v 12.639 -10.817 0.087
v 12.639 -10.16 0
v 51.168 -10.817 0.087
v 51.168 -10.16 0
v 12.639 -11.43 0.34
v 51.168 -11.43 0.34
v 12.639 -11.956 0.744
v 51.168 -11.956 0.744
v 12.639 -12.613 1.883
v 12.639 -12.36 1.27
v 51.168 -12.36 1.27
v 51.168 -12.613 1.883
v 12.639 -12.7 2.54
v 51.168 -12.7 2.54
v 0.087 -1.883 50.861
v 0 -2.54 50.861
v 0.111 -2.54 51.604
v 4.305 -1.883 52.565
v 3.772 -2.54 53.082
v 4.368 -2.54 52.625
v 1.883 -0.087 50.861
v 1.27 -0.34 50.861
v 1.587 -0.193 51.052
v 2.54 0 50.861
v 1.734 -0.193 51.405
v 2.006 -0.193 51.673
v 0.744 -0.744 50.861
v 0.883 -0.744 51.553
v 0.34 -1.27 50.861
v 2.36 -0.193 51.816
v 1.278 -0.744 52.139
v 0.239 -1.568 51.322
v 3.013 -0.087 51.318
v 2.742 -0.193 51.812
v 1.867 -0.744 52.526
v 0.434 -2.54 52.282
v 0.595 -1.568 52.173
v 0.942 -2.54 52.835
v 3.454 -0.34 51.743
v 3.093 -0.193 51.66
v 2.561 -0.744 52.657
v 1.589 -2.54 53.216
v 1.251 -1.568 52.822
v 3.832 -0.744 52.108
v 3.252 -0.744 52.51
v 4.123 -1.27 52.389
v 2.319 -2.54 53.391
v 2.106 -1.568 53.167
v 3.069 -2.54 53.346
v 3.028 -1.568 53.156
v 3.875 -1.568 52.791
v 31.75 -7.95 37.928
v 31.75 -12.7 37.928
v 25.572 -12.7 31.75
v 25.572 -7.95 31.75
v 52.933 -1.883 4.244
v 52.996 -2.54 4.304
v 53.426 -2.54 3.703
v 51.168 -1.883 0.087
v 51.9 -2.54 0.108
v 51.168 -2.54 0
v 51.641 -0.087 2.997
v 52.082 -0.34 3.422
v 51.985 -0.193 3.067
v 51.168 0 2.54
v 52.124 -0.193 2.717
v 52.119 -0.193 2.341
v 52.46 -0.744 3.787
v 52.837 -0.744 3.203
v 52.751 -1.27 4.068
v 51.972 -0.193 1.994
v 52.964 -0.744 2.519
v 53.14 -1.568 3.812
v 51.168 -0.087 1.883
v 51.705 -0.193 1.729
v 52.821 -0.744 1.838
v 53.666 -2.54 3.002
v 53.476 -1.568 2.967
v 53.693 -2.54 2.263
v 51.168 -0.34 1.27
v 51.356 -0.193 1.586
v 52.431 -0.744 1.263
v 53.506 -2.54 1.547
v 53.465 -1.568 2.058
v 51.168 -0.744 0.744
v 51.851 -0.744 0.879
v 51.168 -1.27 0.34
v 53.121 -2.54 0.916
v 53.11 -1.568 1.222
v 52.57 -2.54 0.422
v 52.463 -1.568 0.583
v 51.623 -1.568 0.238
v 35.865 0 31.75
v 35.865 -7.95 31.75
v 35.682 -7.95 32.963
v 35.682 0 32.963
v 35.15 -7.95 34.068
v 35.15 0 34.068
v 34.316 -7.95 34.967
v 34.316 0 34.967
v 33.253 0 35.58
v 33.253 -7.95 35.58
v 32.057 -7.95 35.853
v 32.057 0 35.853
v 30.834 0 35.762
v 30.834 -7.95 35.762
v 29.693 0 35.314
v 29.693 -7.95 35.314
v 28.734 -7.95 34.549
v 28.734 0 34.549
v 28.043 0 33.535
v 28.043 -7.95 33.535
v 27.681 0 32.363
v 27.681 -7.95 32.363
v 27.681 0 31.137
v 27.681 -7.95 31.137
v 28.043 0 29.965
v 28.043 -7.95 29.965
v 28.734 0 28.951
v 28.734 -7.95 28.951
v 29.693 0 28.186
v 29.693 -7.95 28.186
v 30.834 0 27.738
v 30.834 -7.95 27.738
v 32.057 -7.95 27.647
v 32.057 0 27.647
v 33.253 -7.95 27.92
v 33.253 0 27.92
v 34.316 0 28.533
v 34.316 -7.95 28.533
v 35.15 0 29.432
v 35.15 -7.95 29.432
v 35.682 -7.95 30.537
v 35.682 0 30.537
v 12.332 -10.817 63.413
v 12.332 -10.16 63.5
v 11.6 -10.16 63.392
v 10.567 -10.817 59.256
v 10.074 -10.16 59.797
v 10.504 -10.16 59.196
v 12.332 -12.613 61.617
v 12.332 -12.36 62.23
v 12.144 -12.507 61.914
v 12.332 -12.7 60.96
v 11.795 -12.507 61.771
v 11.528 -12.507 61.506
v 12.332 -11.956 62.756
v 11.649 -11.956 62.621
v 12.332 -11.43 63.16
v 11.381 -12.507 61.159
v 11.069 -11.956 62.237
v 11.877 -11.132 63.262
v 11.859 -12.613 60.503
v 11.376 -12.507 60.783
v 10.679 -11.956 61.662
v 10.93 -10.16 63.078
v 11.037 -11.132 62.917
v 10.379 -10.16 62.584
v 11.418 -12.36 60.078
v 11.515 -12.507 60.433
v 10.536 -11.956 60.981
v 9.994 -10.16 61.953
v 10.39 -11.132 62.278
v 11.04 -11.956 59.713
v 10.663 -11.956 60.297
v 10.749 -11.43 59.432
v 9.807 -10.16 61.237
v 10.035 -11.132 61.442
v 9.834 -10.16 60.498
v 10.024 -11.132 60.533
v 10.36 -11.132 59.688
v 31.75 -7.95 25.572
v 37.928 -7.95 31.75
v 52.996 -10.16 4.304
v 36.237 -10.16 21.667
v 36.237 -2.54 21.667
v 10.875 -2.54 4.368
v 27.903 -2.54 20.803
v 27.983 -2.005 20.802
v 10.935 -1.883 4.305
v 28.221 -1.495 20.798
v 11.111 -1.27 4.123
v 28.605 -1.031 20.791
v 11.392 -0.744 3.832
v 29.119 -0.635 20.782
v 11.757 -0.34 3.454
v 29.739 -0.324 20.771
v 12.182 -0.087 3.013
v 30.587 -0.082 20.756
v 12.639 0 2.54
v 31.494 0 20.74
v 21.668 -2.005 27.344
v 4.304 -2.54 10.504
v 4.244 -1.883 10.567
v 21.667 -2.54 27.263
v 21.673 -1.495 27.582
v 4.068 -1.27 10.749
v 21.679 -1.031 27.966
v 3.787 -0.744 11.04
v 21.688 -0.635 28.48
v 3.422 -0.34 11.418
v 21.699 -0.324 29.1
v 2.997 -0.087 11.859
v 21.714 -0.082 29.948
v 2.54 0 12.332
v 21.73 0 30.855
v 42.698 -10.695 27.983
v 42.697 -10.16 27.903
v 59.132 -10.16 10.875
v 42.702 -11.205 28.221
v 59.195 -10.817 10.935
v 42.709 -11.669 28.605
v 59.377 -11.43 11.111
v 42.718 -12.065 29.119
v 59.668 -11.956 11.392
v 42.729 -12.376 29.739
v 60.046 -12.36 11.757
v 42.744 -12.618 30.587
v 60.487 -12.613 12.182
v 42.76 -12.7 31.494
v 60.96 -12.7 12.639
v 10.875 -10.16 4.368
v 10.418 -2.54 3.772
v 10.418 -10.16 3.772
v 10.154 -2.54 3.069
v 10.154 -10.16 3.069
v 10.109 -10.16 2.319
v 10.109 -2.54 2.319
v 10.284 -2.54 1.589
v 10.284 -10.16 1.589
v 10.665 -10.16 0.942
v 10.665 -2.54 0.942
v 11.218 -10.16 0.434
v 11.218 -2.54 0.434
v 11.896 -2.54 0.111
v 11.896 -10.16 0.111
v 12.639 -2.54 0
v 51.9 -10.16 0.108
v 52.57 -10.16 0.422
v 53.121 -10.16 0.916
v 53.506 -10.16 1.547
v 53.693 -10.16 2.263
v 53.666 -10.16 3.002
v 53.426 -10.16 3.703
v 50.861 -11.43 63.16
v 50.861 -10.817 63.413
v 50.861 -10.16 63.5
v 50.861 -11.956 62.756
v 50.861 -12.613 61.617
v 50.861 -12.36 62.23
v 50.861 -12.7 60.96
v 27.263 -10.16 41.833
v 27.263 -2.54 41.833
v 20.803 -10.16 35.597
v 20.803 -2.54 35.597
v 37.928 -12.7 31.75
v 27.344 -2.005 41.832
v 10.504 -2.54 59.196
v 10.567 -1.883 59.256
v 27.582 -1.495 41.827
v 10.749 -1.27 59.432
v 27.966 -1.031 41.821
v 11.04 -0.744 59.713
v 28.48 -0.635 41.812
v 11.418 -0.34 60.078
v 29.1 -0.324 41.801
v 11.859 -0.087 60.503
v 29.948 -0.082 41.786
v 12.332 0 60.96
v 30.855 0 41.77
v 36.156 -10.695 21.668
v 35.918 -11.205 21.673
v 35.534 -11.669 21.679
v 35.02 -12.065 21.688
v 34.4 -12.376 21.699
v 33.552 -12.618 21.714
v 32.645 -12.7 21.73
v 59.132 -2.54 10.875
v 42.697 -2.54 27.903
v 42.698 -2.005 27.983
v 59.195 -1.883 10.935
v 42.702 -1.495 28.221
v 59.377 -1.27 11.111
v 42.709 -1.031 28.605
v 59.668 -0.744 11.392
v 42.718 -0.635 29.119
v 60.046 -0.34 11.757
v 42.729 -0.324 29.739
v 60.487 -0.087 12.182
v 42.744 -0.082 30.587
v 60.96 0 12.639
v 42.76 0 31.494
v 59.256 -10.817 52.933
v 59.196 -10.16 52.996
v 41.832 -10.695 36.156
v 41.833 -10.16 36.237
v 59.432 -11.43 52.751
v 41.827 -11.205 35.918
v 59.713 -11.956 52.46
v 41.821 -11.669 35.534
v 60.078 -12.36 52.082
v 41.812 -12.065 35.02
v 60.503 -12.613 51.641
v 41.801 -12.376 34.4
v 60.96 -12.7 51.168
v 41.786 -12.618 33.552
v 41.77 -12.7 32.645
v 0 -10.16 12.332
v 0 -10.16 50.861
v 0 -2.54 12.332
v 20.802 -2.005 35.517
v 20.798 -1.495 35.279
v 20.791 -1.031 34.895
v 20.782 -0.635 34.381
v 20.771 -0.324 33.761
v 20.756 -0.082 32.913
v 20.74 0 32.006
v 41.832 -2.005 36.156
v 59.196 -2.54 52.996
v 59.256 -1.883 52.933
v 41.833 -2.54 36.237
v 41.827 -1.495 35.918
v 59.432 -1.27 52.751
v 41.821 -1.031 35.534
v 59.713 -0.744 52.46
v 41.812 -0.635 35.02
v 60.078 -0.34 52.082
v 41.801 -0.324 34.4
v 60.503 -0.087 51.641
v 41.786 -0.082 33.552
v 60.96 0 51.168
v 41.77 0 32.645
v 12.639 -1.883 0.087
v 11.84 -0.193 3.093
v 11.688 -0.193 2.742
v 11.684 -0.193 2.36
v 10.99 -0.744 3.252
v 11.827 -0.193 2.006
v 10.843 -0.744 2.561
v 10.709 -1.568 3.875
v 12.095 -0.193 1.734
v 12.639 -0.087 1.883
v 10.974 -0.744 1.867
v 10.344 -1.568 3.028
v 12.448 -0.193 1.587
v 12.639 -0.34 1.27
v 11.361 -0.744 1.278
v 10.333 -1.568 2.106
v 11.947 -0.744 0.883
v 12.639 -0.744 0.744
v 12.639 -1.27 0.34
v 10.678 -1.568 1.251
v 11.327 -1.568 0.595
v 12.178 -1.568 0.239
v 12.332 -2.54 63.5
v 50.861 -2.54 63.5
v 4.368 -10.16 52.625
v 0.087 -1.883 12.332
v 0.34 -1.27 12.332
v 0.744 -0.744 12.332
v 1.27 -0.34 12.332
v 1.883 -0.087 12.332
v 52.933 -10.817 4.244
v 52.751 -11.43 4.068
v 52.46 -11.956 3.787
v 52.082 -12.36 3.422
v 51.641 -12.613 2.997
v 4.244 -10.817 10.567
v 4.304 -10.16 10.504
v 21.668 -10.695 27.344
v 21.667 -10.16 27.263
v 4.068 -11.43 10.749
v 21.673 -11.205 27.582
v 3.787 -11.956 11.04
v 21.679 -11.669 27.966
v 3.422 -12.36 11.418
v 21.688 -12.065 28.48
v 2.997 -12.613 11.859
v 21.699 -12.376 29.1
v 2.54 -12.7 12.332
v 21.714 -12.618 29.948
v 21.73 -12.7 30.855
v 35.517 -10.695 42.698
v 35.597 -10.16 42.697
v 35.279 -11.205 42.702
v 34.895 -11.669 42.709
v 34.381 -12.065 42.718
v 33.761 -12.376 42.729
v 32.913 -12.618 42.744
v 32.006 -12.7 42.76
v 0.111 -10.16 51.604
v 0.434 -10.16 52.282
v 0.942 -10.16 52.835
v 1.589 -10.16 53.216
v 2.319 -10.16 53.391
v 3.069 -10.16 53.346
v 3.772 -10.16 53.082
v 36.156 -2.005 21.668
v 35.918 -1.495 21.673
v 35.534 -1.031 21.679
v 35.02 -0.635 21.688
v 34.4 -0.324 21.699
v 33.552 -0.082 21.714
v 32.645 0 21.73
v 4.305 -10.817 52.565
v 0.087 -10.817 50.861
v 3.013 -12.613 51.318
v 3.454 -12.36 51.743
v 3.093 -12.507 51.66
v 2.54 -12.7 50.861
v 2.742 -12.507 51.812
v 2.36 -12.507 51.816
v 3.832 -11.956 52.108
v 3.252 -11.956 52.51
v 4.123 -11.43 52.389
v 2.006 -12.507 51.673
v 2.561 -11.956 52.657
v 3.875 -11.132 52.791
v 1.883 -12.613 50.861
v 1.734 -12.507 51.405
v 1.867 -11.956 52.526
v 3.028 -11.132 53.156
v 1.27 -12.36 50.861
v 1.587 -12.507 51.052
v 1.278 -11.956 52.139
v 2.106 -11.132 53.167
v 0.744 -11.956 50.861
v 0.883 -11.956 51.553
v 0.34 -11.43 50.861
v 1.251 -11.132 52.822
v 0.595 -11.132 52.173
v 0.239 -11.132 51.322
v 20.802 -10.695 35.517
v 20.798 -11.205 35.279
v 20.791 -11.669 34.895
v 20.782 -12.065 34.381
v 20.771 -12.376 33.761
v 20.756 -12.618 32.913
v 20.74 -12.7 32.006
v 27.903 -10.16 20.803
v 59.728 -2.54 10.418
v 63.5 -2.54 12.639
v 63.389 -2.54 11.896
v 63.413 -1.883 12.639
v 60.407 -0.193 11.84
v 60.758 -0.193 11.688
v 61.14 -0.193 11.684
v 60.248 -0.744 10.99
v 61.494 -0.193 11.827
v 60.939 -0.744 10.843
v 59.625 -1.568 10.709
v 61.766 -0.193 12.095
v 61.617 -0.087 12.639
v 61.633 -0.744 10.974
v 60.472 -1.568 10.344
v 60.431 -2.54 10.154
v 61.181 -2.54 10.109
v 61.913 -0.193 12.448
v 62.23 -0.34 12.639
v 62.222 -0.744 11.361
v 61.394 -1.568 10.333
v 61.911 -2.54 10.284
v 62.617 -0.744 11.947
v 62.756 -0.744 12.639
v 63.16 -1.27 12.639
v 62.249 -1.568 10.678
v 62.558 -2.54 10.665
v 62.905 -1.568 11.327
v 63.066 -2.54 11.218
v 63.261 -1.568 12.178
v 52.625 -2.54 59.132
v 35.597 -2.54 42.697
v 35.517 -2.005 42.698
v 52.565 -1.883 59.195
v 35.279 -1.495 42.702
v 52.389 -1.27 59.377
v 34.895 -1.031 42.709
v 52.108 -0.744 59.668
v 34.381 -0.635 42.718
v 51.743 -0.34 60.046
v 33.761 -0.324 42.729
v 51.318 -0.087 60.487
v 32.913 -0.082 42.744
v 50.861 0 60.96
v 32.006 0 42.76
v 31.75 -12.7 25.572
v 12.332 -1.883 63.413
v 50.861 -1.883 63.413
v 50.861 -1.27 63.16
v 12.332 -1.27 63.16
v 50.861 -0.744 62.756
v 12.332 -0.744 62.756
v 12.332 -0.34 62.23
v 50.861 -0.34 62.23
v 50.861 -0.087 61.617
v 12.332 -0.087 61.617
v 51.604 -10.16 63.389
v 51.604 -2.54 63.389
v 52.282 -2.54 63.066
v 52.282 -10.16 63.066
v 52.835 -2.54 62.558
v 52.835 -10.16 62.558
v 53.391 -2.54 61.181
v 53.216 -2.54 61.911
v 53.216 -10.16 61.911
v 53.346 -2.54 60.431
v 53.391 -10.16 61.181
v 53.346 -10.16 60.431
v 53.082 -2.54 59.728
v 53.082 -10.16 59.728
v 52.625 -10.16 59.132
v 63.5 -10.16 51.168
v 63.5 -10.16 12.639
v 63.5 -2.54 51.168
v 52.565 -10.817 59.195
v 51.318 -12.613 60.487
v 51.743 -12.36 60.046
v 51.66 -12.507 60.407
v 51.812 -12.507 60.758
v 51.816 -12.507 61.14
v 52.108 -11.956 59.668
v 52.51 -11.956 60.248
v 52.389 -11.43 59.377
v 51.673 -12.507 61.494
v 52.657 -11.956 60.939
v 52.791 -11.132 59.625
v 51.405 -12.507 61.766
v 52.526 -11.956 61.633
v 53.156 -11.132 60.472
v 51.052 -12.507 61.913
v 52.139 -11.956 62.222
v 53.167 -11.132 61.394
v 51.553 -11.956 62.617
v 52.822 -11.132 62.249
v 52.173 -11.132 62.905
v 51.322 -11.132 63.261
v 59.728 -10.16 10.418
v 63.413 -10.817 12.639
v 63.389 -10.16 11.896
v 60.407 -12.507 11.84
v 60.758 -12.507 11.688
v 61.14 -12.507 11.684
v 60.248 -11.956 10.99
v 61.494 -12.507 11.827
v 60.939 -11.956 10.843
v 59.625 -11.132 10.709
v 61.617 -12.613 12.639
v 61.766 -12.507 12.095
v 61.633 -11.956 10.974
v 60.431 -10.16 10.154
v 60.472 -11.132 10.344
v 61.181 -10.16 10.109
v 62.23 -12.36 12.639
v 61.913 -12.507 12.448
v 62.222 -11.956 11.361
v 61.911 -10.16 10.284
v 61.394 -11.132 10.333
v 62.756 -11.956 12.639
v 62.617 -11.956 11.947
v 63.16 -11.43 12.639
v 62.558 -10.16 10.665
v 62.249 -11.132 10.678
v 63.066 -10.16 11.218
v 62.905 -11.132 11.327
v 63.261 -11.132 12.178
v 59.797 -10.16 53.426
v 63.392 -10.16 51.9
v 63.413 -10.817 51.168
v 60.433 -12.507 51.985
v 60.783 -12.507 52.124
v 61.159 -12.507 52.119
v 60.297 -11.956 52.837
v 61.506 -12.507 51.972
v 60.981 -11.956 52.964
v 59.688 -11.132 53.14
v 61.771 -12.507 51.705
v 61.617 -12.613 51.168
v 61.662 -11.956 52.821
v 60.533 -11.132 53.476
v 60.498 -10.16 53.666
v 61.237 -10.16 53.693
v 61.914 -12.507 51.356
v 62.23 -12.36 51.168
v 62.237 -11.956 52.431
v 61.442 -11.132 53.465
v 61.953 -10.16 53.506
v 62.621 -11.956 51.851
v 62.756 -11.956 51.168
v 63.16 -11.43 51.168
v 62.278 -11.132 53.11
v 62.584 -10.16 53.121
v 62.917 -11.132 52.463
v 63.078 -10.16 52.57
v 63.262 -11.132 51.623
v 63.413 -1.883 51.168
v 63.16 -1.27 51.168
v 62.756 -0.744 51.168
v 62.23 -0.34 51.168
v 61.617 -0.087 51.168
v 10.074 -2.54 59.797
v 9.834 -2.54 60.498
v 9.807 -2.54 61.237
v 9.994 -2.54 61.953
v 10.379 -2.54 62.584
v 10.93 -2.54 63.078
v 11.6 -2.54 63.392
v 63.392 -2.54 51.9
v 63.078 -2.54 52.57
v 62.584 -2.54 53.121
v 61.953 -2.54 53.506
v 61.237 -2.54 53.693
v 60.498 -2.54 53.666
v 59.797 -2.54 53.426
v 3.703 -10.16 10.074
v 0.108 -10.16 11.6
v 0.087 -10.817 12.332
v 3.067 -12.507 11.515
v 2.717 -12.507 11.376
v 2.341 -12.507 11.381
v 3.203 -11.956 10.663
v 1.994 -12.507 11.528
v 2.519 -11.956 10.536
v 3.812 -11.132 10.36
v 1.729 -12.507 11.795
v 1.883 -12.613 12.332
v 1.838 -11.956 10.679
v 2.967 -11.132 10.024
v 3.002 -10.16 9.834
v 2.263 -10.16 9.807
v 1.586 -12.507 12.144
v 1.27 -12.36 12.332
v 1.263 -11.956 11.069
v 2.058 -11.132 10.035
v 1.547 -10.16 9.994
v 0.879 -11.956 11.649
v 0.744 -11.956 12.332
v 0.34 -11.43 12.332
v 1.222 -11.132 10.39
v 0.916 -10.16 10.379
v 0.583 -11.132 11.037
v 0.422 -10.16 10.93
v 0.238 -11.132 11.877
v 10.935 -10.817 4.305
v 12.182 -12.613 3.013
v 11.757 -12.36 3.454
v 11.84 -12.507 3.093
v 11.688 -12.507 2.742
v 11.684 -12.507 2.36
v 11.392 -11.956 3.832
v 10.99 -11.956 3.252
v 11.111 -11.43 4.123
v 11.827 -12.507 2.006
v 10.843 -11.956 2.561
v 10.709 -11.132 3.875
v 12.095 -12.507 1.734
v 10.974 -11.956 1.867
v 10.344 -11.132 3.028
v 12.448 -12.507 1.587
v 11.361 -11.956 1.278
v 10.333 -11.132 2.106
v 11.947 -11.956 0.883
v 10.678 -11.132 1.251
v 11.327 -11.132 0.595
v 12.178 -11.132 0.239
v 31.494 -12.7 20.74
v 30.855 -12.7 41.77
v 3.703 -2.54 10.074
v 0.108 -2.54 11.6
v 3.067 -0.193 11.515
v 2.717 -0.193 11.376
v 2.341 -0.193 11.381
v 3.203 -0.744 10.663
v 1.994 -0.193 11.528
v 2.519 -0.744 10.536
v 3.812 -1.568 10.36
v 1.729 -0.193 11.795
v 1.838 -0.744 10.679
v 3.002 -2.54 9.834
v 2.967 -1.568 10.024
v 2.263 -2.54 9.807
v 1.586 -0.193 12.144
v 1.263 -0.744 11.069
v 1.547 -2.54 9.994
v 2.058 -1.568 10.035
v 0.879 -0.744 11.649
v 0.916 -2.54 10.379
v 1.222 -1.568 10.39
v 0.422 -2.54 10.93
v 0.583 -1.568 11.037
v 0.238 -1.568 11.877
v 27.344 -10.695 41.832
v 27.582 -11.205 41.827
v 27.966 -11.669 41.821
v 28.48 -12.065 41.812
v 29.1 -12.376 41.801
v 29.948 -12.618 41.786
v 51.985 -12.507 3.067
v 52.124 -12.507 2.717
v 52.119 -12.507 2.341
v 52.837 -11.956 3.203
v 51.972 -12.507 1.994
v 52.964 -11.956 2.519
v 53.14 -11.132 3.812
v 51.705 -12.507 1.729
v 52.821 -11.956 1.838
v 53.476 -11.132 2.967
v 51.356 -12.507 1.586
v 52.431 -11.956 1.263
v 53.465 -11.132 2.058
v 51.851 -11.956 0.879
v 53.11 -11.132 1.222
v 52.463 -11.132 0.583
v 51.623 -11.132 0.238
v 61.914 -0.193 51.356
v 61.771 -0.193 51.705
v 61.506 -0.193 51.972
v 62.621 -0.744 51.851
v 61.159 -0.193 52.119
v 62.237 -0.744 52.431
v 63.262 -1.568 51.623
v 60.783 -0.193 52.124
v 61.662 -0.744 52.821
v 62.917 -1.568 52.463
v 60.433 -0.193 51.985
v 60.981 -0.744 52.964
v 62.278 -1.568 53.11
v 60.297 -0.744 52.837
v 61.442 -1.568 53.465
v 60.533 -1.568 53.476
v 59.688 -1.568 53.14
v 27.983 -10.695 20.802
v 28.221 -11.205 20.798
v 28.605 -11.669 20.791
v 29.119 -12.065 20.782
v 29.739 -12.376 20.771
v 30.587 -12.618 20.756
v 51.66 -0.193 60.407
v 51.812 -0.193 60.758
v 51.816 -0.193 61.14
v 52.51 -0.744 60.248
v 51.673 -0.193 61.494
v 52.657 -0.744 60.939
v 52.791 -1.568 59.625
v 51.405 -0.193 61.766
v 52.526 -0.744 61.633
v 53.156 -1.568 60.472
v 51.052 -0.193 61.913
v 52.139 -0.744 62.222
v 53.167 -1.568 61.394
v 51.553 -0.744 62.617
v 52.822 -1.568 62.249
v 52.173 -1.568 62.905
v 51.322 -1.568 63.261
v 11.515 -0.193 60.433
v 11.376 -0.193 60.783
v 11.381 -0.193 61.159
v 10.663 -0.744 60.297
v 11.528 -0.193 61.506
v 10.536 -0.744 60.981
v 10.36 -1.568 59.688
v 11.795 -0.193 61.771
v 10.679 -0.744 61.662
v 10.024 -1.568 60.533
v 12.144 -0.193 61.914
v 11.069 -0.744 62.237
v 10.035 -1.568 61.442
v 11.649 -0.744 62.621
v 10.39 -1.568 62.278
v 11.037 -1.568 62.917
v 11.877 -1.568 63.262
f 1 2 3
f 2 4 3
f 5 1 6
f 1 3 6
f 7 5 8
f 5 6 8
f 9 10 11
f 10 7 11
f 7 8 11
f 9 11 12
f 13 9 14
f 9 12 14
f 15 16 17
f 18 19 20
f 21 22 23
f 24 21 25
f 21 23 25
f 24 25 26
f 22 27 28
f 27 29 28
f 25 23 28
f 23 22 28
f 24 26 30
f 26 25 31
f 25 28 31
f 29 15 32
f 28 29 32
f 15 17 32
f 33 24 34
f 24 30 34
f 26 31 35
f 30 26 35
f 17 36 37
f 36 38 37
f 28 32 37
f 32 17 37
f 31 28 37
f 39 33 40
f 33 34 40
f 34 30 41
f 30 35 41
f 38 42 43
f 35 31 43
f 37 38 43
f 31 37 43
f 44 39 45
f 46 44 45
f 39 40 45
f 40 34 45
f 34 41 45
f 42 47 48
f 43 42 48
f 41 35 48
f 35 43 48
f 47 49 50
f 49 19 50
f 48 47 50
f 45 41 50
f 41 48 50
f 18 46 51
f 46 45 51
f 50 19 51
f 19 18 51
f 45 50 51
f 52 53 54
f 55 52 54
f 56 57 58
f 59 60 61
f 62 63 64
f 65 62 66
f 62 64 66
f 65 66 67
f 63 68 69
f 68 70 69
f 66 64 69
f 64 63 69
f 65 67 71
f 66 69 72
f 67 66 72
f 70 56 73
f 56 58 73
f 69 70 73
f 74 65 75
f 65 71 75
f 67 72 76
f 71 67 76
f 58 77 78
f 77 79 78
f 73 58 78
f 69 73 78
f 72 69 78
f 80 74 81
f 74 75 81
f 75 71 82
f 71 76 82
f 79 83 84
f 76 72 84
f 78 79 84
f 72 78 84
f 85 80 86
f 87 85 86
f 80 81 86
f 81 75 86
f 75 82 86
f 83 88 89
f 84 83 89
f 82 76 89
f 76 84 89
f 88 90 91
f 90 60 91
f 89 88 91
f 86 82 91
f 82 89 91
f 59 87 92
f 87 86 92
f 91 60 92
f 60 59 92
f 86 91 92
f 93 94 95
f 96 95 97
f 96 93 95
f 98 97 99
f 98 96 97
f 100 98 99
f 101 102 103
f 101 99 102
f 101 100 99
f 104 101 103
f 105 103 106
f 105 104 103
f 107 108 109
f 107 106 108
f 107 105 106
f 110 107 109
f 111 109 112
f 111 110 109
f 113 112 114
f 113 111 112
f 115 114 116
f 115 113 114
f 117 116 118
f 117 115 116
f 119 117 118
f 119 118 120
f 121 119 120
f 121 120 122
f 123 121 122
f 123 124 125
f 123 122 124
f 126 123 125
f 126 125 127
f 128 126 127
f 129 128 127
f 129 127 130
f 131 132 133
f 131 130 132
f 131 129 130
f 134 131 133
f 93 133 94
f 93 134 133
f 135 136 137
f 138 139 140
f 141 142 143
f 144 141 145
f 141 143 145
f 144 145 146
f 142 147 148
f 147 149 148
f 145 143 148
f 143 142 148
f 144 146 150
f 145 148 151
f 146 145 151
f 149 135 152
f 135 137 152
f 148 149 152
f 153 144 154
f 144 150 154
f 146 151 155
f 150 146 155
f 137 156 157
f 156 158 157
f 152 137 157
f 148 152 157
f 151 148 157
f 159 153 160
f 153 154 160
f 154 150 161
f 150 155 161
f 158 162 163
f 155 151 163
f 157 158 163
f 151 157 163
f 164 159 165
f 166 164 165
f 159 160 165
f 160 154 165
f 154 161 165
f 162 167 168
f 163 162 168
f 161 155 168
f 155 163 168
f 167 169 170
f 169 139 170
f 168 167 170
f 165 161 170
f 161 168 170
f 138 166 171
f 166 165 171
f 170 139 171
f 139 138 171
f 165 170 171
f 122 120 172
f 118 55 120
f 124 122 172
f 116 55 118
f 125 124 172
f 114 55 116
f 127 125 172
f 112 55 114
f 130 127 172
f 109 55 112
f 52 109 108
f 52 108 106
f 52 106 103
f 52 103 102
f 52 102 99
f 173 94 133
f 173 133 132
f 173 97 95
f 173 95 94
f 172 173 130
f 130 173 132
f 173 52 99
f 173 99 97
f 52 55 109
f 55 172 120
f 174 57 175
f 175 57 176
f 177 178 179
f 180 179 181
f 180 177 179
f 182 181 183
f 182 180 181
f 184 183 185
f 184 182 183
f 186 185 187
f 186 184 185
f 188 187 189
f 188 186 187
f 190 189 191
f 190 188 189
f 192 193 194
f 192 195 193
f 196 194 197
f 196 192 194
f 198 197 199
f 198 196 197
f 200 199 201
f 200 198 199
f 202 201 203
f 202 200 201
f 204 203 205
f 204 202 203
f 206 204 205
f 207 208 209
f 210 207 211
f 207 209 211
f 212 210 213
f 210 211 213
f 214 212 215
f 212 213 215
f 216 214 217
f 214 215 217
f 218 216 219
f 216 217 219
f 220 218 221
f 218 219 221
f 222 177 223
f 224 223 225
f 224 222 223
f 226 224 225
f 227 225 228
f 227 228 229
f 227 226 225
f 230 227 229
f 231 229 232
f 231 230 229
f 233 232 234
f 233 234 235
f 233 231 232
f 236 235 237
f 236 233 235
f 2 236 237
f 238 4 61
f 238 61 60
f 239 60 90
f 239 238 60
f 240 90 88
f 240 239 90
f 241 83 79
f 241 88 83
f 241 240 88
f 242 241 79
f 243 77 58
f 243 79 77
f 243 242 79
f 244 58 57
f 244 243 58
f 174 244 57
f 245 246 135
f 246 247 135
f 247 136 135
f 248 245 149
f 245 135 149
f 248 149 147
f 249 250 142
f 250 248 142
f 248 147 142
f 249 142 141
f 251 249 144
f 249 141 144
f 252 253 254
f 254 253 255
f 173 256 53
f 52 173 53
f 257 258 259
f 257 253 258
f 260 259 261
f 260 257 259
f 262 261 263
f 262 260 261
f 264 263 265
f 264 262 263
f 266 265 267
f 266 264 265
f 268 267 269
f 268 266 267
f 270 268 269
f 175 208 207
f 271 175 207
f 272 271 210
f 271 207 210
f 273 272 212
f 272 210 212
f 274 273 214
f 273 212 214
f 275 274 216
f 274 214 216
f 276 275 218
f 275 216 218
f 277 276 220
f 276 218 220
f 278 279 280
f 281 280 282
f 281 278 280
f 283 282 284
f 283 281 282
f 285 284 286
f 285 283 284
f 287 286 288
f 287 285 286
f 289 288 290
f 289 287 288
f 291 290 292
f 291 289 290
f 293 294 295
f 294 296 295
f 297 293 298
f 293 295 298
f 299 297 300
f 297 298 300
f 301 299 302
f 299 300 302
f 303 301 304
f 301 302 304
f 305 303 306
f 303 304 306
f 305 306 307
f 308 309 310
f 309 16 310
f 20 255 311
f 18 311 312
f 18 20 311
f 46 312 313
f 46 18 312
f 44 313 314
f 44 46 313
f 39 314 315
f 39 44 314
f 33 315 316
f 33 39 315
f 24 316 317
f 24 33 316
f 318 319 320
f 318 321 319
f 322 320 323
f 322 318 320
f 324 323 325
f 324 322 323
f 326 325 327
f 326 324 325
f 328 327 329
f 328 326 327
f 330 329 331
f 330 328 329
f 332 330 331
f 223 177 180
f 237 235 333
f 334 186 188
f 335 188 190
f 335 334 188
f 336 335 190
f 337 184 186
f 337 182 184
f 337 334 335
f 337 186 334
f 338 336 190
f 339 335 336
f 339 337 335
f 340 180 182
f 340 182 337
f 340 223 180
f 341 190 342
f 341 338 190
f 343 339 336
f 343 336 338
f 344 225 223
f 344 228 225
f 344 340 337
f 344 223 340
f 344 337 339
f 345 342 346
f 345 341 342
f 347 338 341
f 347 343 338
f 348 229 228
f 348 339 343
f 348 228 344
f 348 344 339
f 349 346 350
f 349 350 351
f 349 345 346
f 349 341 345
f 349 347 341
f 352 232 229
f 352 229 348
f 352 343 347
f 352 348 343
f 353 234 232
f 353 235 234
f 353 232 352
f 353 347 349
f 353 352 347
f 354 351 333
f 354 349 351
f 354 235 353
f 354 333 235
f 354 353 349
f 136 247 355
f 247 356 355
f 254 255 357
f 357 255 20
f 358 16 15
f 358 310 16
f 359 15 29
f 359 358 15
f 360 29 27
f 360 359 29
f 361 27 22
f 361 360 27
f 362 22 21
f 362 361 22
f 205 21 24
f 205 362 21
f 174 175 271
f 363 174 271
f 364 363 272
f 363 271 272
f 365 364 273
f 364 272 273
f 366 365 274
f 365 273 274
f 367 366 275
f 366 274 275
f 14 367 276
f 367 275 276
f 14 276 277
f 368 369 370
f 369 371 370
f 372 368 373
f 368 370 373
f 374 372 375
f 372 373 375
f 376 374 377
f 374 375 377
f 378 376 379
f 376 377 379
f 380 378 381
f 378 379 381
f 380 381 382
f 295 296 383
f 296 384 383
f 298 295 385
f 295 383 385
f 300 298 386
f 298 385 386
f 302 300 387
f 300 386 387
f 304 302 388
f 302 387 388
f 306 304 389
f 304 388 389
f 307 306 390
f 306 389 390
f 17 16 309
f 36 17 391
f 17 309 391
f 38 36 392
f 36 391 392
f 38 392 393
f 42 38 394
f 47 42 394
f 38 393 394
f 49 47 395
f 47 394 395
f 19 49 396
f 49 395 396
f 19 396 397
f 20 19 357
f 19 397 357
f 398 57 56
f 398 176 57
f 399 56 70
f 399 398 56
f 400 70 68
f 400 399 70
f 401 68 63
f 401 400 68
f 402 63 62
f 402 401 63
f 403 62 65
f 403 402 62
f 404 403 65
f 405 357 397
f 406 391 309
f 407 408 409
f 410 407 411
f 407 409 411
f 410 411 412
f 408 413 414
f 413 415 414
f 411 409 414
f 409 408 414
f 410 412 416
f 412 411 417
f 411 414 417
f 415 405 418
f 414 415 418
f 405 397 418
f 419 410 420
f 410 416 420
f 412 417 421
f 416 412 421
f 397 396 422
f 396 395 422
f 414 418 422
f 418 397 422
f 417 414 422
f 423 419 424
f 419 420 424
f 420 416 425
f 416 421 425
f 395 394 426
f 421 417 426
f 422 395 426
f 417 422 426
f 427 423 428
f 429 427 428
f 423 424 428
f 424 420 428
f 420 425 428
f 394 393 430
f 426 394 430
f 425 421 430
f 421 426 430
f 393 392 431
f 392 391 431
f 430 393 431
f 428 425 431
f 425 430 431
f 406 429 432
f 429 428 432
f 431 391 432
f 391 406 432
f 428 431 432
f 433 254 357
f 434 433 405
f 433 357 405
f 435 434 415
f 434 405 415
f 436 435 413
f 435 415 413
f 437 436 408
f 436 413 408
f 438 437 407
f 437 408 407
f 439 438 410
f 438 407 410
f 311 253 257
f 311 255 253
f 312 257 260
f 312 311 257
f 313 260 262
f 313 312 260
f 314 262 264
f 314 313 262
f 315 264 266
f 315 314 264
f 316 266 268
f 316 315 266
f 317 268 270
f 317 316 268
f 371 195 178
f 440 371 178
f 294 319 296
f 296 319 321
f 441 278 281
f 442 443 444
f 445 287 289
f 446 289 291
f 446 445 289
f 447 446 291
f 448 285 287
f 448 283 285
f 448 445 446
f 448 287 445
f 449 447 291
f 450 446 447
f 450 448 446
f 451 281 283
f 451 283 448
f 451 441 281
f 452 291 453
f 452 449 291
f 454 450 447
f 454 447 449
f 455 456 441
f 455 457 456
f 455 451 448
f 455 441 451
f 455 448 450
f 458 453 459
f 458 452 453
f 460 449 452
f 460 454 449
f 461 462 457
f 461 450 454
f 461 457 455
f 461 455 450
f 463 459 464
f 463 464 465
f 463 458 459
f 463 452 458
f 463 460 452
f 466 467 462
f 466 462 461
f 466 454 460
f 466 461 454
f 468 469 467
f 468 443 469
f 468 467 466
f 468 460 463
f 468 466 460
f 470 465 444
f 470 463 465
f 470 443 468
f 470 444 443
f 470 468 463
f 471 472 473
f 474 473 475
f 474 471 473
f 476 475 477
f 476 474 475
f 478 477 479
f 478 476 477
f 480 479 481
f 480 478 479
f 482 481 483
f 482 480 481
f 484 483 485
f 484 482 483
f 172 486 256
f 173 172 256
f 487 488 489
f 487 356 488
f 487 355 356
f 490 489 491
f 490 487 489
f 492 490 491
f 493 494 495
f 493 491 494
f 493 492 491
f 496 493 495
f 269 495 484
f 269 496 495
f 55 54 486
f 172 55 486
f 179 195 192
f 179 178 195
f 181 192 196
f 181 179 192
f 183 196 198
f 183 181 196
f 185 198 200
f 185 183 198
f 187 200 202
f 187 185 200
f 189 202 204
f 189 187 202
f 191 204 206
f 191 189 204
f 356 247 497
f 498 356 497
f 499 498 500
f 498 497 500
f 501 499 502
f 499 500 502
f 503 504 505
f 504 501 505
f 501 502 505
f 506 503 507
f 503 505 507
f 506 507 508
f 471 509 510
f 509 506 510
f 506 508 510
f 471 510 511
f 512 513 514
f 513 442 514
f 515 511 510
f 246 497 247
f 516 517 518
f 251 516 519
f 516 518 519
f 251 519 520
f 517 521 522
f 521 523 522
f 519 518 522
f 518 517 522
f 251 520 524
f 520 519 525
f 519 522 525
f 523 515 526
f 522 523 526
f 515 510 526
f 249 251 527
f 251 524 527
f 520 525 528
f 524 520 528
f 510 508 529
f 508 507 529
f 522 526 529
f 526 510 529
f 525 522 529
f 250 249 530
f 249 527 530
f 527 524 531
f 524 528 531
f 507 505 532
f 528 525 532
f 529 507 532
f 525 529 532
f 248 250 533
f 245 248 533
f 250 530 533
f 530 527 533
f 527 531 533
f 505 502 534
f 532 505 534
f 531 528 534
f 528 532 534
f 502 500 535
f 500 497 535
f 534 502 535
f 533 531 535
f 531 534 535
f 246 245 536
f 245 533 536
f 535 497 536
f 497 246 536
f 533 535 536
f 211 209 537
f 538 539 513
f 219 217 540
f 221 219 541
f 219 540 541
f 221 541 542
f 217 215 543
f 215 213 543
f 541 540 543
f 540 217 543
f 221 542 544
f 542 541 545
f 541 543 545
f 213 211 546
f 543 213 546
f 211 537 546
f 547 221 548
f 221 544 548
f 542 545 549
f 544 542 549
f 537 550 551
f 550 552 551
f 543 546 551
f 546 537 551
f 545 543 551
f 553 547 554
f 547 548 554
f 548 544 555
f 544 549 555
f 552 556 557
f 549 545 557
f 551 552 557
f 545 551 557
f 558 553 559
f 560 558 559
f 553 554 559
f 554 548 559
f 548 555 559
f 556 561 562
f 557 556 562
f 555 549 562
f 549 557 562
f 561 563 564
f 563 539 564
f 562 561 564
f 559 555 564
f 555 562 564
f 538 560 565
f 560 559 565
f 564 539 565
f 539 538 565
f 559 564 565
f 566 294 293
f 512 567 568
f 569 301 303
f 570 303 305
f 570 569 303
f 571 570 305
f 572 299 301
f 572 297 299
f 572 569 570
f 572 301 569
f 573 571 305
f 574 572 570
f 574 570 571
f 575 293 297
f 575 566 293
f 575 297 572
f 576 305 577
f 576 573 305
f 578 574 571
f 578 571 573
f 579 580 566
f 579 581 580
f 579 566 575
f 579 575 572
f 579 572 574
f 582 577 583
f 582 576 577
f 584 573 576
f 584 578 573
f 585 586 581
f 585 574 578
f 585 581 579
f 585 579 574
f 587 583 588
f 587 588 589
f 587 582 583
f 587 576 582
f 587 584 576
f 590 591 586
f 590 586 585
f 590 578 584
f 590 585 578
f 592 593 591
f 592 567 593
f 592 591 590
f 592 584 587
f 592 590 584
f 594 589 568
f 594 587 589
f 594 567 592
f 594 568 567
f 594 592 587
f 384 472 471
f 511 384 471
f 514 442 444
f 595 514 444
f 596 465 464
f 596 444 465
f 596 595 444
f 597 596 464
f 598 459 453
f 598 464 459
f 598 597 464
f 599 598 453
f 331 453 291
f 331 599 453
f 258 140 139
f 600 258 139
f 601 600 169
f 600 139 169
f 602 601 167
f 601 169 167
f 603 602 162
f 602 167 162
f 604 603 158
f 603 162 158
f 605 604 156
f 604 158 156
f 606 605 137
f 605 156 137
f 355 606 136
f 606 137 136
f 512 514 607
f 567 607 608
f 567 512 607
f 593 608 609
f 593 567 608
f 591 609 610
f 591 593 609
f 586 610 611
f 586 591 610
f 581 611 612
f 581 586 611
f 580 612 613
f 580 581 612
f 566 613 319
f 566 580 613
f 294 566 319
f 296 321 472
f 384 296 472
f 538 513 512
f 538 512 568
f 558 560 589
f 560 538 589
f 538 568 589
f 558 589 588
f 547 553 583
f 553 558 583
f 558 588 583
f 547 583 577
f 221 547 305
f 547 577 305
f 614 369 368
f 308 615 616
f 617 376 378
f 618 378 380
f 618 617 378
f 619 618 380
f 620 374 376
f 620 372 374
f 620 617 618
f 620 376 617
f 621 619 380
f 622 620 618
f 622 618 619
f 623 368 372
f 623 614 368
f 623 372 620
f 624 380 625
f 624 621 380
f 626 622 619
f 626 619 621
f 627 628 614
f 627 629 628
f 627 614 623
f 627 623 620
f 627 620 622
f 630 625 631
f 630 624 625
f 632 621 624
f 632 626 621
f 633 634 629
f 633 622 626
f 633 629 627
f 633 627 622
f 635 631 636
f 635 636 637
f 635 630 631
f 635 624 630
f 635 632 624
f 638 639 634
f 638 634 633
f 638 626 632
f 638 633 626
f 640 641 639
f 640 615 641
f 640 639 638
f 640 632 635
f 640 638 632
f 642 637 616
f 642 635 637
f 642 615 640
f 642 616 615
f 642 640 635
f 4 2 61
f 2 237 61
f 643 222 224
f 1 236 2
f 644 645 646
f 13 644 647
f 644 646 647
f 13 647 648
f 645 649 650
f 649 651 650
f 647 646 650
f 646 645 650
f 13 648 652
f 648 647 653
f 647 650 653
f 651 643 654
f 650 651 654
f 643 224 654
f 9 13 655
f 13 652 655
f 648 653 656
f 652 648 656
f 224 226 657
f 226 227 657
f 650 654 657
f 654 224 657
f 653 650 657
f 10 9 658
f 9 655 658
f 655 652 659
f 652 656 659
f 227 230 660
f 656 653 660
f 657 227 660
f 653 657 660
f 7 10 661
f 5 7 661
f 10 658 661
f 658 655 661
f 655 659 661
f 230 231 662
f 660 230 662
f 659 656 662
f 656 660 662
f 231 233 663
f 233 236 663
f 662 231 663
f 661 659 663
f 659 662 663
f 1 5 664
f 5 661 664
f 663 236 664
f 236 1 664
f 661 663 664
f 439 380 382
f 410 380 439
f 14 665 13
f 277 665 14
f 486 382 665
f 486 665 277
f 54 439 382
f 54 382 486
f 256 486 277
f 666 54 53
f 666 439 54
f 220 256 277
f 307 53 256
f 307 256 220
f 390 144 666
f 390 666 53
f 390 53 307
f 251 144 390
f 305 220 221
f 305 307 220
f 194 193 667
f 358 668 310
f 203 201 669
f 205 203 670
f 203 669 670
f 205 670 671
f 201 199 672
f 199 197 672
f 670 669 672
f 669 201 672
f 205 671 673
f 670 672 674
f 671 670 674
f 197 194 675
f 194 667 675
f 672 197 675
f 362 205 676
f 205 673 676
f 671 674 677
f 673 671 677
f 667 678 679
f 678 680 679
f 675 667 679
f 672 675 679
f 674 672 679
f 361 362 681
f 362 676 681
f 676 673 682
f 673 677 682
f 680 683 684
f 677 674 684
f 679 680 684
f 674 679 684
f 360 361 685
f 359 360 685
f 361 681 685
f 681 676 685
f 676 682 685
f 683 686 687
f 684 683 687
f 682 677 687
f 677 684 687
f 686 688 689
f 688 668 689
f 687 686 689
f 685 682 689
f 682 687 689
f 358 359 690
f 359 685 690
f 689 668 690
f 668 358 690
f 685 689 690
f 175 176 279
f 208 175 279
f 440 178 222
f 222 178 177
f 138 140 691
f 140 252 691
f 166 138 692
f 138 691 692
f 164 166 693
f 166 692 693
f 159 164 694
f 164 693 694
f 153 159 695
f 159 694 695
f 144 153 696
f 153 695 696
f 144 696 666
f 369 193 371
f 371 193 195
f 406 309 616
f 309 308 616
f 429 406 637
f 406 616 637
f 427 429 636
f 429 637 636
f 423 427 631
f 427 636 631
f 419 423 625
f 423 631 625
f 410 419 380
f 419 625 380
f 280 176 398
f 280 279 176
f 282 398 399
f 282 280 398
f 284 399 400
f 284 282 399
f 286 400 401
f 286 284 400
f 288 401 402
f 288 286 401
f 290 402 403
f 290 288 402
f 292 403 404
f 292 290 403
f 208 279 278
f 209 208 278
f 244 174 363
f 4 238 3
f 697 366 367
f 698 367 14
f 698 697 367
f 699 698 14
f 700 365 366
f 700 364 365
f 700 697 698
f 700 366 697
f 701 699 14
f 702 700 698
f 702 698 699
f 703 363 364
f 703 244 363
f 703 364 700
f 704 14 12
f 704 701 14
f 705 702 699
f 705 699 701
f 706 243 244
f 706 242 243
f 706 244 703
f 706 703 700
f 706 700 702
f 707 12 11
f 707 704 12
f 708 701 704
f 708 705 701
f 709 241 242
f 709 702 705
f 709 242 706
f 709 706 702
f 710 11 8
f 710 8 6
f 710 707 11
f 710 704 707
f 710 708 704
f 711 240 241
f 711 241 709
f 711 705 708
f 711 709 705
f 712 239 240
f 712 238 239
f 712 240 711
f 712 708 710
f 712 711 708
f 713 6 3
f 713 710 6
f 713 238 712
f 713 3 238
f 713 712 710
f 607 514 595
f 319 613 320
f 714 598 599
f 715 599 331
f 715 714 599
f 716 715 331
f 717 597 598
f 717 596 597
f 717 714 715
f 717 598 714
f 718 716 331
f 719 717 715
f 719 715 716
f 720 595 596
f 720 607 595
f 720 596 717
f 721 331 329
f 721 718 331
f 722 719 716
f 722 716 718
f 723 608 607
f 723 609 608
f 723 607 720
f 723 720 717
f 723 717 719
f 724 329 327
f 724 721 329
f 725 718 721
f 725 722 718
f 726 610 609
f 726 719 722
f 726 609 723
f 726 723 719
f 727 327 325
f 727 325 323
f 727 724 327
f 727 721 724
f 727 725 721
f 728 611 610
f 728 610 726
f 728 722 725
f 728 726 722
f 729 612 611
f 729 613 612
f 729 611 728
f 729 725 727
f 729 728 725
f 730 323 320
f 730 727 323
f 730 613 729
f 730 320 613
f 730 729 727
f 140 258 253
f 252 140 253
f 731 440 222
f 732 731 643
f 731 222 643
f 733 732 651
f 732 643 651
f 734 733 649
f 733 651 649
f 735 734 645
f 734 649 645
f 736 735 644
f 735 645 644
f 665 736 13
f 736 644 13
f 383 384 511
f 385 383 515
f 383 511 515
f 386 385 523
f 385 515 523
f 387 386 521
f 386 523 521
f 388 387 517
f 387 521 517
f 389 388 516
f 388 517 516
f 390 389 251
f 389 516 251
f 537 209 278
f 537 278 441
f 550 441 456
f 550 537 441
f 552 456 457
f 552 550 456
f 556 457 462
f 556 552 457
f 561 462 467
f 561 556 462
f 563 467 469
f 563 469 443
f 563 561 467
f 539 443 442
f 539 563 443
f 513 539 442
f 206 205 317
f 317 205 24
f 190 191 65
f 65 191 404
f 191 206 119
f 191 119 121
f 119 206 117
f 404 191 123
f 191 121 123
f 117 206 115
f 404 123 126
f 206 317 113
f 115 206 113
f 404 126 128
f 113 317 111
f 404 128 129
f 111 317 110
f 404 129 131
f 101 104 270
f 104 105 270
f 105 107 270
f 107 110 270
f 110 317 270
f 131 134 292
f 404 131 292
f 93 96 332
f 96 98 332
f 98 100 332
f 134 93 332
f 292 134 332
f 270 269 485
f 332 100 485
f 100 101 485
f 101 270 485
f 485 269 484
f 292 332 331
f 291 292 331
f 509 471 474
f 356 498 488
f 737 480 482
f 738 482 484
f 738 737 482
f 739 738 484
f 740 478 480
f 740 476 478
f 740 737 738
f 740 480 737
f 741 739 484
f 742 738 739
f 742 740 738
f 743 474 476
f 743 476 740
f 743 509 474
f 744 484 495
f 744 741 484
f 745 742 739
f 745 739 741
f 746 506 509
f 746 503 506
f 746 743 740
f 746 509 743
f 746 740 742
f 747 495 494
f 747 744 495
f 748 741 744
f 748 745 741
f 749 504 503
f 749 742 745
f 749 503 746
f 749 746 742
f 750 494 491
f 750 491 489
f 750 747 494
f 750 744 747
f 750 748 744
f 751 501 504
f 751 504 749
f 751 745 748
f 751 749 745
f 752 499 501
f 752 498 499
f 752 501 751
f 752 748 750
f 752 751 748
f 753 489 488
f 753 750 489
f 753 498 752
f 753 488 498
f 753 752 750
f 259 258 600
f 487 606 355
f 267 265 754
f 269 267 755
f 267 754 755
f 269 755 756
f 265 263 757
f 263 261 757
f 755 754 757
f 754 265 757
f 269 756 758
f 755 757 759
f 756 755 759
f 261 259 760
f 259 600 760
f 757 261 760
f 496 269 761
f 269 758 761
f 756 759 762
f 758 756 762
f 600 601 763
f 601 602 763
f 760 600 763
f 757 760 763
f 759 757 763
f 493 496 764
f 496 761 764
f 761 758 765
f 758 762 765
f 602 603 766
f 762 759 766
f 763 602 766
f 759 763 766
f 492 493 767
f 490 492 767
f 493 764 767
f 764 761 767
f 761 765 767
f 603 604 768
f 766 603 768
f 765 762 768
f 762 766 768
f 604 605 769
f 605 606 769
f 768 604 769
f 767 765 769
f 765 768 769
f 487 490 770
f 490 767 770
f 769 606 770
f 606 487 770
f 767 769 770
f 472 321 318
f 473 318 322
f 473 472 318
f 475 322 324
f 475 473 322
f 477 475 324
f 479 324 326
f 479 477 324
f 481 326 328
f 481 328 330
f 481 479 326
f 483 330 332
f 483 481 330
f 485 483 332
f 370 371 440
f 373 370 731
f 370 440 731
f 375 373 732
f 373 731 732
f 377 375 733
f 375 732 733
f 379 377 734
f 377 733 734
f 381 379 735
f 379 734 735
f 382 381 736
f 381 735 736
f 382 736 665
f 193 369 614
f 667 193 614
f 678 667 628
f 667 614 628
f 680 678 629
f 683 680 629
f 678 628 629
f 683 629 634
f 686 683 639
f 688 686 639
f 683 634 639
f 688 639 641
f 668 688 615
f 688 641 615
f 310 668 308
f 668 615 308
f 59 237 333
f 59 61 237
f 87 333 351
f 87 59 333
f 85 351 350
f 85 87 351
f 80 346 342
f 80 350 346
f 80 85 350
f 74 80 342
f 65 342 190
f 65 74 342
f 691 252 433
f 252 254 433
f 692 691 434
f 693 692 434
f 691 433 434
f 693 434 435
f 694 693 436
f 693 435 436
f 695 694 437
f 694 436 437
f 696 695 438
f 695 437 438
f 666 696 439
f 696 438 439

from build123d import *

# Parameters (mm, degrees)
F0_R     = 4.1148
F1_DEPTH = 12.7
F2_R     = 2.54
F5_DEPTH = 4.7498


# Not quite as in the source:
# - two fillets or chamfers of one size are made in one step
# - a feature of the source that left no trace in its solid (it failed there, or was rolled back) is left out
# - a feature names something its author has since deleted; it is built from what else it names


with BuildPart() as f1:
    # F0 (on Front) → F1 (new body)
    with BuildSketch(Plane.XZ):
        Polygon((27.9026240856, 20.8031311891), (6.35, 0), (57.15, 0), (36.2365272497, 21.6669410203), (42.6968688109, 27.9026240856), (63.5, 6.35), (63.5, 57.15), (41.8330589797, 36.2365272497), (35.5973759144, 42.6968688109), (57.15, 63.5), (6.35, 63.5), (27.2634727503, 41.8330589797), (20.8031311891, 35.5973759144), (0, 57.15), (0, 6.35), (21.6669410203, 27.2634727503), align=None)
        with Locations((31.75, 31.75)):
            Circle(F0_R, mode=Mode.SUBTRACT)
    extrude(amount=F1_DEPTH)

    # F2
    f2_edges = [f1.edges().sort_by_distance(p)[0] for p in [
        (31.75, -12.7, 63.5),
        (31.75, 0, 63.5),
        (10.401566, -12.7, 46.373688),
        (63.5, -12.7, 31.75),
        (31.75, -12.7, 0),
        (31.75, 0, 0),
        (0, -12.7, 31.75),
        (16.806736, -12.7, 52.666529),
        (24.033302, -12.7, 38.715217),
        (0, -6.35, 57.15),
        (6.35, -6.35, 63.5),
        (0, 0, 31.75),
        (24.784783, 0, 24.033302),
        (24.784783, -12.7, 24.033302),
        (6.35, -6.35, 0),
        (17.126312, 0, 10.401566),
        (17.126312, -12.7, 10.401566),
        (57.15, -6.35, 0),
        (46.693264, 0, 10.833471),
        (46.693264, -12.7, 10.833471),
        (39.466698, 0, 24.784783),
        (39.466698, -12.7, 24.784783),
        (63.5, -6.35, 6.35),
        (53.098434, 0, 17.126312),
        (53.098434, -12.7, 17.126312),
        (63.5, -6.35, 57.15),
        (63.5, 0, 31.75),
        (52.666529, 0, 46.693264),
        (52.666529, -12.7, 46.693264),
        (38.715217, 0, 39.466698),
        (38.715217, -12.7, 39.466698),
        (57.15, -6.35, 63.5),
        (46.373688, 0, 53.098434),
        (46.373688, -12.7, 53.098434),
        (16.806736, 0, 52.666529),
        (24.033302, 0, 38.715217),
        (10.401566, 0, 46.373688),
        (0, -6.35, 6.35),
        (10.833471, 0, 16.806736),
        (10.833471, -12.7, 16.806736),
    ]]
    fillet(f2_edges, radius=F2_R)

    # F4 (on face) → F5 (cut)
    with BuildSketch(Plane.XZ.offset(12.7)):
        Polygon((31.75, 25.5715837887), (37.9284162113, 31.75), (31.75, 37.9284162113), (25.5715837887, 31.75), align=None)
    extrude(amount=-F5_DEPTH, mode=Mode.SUBTRACT)


solid = f1.part
